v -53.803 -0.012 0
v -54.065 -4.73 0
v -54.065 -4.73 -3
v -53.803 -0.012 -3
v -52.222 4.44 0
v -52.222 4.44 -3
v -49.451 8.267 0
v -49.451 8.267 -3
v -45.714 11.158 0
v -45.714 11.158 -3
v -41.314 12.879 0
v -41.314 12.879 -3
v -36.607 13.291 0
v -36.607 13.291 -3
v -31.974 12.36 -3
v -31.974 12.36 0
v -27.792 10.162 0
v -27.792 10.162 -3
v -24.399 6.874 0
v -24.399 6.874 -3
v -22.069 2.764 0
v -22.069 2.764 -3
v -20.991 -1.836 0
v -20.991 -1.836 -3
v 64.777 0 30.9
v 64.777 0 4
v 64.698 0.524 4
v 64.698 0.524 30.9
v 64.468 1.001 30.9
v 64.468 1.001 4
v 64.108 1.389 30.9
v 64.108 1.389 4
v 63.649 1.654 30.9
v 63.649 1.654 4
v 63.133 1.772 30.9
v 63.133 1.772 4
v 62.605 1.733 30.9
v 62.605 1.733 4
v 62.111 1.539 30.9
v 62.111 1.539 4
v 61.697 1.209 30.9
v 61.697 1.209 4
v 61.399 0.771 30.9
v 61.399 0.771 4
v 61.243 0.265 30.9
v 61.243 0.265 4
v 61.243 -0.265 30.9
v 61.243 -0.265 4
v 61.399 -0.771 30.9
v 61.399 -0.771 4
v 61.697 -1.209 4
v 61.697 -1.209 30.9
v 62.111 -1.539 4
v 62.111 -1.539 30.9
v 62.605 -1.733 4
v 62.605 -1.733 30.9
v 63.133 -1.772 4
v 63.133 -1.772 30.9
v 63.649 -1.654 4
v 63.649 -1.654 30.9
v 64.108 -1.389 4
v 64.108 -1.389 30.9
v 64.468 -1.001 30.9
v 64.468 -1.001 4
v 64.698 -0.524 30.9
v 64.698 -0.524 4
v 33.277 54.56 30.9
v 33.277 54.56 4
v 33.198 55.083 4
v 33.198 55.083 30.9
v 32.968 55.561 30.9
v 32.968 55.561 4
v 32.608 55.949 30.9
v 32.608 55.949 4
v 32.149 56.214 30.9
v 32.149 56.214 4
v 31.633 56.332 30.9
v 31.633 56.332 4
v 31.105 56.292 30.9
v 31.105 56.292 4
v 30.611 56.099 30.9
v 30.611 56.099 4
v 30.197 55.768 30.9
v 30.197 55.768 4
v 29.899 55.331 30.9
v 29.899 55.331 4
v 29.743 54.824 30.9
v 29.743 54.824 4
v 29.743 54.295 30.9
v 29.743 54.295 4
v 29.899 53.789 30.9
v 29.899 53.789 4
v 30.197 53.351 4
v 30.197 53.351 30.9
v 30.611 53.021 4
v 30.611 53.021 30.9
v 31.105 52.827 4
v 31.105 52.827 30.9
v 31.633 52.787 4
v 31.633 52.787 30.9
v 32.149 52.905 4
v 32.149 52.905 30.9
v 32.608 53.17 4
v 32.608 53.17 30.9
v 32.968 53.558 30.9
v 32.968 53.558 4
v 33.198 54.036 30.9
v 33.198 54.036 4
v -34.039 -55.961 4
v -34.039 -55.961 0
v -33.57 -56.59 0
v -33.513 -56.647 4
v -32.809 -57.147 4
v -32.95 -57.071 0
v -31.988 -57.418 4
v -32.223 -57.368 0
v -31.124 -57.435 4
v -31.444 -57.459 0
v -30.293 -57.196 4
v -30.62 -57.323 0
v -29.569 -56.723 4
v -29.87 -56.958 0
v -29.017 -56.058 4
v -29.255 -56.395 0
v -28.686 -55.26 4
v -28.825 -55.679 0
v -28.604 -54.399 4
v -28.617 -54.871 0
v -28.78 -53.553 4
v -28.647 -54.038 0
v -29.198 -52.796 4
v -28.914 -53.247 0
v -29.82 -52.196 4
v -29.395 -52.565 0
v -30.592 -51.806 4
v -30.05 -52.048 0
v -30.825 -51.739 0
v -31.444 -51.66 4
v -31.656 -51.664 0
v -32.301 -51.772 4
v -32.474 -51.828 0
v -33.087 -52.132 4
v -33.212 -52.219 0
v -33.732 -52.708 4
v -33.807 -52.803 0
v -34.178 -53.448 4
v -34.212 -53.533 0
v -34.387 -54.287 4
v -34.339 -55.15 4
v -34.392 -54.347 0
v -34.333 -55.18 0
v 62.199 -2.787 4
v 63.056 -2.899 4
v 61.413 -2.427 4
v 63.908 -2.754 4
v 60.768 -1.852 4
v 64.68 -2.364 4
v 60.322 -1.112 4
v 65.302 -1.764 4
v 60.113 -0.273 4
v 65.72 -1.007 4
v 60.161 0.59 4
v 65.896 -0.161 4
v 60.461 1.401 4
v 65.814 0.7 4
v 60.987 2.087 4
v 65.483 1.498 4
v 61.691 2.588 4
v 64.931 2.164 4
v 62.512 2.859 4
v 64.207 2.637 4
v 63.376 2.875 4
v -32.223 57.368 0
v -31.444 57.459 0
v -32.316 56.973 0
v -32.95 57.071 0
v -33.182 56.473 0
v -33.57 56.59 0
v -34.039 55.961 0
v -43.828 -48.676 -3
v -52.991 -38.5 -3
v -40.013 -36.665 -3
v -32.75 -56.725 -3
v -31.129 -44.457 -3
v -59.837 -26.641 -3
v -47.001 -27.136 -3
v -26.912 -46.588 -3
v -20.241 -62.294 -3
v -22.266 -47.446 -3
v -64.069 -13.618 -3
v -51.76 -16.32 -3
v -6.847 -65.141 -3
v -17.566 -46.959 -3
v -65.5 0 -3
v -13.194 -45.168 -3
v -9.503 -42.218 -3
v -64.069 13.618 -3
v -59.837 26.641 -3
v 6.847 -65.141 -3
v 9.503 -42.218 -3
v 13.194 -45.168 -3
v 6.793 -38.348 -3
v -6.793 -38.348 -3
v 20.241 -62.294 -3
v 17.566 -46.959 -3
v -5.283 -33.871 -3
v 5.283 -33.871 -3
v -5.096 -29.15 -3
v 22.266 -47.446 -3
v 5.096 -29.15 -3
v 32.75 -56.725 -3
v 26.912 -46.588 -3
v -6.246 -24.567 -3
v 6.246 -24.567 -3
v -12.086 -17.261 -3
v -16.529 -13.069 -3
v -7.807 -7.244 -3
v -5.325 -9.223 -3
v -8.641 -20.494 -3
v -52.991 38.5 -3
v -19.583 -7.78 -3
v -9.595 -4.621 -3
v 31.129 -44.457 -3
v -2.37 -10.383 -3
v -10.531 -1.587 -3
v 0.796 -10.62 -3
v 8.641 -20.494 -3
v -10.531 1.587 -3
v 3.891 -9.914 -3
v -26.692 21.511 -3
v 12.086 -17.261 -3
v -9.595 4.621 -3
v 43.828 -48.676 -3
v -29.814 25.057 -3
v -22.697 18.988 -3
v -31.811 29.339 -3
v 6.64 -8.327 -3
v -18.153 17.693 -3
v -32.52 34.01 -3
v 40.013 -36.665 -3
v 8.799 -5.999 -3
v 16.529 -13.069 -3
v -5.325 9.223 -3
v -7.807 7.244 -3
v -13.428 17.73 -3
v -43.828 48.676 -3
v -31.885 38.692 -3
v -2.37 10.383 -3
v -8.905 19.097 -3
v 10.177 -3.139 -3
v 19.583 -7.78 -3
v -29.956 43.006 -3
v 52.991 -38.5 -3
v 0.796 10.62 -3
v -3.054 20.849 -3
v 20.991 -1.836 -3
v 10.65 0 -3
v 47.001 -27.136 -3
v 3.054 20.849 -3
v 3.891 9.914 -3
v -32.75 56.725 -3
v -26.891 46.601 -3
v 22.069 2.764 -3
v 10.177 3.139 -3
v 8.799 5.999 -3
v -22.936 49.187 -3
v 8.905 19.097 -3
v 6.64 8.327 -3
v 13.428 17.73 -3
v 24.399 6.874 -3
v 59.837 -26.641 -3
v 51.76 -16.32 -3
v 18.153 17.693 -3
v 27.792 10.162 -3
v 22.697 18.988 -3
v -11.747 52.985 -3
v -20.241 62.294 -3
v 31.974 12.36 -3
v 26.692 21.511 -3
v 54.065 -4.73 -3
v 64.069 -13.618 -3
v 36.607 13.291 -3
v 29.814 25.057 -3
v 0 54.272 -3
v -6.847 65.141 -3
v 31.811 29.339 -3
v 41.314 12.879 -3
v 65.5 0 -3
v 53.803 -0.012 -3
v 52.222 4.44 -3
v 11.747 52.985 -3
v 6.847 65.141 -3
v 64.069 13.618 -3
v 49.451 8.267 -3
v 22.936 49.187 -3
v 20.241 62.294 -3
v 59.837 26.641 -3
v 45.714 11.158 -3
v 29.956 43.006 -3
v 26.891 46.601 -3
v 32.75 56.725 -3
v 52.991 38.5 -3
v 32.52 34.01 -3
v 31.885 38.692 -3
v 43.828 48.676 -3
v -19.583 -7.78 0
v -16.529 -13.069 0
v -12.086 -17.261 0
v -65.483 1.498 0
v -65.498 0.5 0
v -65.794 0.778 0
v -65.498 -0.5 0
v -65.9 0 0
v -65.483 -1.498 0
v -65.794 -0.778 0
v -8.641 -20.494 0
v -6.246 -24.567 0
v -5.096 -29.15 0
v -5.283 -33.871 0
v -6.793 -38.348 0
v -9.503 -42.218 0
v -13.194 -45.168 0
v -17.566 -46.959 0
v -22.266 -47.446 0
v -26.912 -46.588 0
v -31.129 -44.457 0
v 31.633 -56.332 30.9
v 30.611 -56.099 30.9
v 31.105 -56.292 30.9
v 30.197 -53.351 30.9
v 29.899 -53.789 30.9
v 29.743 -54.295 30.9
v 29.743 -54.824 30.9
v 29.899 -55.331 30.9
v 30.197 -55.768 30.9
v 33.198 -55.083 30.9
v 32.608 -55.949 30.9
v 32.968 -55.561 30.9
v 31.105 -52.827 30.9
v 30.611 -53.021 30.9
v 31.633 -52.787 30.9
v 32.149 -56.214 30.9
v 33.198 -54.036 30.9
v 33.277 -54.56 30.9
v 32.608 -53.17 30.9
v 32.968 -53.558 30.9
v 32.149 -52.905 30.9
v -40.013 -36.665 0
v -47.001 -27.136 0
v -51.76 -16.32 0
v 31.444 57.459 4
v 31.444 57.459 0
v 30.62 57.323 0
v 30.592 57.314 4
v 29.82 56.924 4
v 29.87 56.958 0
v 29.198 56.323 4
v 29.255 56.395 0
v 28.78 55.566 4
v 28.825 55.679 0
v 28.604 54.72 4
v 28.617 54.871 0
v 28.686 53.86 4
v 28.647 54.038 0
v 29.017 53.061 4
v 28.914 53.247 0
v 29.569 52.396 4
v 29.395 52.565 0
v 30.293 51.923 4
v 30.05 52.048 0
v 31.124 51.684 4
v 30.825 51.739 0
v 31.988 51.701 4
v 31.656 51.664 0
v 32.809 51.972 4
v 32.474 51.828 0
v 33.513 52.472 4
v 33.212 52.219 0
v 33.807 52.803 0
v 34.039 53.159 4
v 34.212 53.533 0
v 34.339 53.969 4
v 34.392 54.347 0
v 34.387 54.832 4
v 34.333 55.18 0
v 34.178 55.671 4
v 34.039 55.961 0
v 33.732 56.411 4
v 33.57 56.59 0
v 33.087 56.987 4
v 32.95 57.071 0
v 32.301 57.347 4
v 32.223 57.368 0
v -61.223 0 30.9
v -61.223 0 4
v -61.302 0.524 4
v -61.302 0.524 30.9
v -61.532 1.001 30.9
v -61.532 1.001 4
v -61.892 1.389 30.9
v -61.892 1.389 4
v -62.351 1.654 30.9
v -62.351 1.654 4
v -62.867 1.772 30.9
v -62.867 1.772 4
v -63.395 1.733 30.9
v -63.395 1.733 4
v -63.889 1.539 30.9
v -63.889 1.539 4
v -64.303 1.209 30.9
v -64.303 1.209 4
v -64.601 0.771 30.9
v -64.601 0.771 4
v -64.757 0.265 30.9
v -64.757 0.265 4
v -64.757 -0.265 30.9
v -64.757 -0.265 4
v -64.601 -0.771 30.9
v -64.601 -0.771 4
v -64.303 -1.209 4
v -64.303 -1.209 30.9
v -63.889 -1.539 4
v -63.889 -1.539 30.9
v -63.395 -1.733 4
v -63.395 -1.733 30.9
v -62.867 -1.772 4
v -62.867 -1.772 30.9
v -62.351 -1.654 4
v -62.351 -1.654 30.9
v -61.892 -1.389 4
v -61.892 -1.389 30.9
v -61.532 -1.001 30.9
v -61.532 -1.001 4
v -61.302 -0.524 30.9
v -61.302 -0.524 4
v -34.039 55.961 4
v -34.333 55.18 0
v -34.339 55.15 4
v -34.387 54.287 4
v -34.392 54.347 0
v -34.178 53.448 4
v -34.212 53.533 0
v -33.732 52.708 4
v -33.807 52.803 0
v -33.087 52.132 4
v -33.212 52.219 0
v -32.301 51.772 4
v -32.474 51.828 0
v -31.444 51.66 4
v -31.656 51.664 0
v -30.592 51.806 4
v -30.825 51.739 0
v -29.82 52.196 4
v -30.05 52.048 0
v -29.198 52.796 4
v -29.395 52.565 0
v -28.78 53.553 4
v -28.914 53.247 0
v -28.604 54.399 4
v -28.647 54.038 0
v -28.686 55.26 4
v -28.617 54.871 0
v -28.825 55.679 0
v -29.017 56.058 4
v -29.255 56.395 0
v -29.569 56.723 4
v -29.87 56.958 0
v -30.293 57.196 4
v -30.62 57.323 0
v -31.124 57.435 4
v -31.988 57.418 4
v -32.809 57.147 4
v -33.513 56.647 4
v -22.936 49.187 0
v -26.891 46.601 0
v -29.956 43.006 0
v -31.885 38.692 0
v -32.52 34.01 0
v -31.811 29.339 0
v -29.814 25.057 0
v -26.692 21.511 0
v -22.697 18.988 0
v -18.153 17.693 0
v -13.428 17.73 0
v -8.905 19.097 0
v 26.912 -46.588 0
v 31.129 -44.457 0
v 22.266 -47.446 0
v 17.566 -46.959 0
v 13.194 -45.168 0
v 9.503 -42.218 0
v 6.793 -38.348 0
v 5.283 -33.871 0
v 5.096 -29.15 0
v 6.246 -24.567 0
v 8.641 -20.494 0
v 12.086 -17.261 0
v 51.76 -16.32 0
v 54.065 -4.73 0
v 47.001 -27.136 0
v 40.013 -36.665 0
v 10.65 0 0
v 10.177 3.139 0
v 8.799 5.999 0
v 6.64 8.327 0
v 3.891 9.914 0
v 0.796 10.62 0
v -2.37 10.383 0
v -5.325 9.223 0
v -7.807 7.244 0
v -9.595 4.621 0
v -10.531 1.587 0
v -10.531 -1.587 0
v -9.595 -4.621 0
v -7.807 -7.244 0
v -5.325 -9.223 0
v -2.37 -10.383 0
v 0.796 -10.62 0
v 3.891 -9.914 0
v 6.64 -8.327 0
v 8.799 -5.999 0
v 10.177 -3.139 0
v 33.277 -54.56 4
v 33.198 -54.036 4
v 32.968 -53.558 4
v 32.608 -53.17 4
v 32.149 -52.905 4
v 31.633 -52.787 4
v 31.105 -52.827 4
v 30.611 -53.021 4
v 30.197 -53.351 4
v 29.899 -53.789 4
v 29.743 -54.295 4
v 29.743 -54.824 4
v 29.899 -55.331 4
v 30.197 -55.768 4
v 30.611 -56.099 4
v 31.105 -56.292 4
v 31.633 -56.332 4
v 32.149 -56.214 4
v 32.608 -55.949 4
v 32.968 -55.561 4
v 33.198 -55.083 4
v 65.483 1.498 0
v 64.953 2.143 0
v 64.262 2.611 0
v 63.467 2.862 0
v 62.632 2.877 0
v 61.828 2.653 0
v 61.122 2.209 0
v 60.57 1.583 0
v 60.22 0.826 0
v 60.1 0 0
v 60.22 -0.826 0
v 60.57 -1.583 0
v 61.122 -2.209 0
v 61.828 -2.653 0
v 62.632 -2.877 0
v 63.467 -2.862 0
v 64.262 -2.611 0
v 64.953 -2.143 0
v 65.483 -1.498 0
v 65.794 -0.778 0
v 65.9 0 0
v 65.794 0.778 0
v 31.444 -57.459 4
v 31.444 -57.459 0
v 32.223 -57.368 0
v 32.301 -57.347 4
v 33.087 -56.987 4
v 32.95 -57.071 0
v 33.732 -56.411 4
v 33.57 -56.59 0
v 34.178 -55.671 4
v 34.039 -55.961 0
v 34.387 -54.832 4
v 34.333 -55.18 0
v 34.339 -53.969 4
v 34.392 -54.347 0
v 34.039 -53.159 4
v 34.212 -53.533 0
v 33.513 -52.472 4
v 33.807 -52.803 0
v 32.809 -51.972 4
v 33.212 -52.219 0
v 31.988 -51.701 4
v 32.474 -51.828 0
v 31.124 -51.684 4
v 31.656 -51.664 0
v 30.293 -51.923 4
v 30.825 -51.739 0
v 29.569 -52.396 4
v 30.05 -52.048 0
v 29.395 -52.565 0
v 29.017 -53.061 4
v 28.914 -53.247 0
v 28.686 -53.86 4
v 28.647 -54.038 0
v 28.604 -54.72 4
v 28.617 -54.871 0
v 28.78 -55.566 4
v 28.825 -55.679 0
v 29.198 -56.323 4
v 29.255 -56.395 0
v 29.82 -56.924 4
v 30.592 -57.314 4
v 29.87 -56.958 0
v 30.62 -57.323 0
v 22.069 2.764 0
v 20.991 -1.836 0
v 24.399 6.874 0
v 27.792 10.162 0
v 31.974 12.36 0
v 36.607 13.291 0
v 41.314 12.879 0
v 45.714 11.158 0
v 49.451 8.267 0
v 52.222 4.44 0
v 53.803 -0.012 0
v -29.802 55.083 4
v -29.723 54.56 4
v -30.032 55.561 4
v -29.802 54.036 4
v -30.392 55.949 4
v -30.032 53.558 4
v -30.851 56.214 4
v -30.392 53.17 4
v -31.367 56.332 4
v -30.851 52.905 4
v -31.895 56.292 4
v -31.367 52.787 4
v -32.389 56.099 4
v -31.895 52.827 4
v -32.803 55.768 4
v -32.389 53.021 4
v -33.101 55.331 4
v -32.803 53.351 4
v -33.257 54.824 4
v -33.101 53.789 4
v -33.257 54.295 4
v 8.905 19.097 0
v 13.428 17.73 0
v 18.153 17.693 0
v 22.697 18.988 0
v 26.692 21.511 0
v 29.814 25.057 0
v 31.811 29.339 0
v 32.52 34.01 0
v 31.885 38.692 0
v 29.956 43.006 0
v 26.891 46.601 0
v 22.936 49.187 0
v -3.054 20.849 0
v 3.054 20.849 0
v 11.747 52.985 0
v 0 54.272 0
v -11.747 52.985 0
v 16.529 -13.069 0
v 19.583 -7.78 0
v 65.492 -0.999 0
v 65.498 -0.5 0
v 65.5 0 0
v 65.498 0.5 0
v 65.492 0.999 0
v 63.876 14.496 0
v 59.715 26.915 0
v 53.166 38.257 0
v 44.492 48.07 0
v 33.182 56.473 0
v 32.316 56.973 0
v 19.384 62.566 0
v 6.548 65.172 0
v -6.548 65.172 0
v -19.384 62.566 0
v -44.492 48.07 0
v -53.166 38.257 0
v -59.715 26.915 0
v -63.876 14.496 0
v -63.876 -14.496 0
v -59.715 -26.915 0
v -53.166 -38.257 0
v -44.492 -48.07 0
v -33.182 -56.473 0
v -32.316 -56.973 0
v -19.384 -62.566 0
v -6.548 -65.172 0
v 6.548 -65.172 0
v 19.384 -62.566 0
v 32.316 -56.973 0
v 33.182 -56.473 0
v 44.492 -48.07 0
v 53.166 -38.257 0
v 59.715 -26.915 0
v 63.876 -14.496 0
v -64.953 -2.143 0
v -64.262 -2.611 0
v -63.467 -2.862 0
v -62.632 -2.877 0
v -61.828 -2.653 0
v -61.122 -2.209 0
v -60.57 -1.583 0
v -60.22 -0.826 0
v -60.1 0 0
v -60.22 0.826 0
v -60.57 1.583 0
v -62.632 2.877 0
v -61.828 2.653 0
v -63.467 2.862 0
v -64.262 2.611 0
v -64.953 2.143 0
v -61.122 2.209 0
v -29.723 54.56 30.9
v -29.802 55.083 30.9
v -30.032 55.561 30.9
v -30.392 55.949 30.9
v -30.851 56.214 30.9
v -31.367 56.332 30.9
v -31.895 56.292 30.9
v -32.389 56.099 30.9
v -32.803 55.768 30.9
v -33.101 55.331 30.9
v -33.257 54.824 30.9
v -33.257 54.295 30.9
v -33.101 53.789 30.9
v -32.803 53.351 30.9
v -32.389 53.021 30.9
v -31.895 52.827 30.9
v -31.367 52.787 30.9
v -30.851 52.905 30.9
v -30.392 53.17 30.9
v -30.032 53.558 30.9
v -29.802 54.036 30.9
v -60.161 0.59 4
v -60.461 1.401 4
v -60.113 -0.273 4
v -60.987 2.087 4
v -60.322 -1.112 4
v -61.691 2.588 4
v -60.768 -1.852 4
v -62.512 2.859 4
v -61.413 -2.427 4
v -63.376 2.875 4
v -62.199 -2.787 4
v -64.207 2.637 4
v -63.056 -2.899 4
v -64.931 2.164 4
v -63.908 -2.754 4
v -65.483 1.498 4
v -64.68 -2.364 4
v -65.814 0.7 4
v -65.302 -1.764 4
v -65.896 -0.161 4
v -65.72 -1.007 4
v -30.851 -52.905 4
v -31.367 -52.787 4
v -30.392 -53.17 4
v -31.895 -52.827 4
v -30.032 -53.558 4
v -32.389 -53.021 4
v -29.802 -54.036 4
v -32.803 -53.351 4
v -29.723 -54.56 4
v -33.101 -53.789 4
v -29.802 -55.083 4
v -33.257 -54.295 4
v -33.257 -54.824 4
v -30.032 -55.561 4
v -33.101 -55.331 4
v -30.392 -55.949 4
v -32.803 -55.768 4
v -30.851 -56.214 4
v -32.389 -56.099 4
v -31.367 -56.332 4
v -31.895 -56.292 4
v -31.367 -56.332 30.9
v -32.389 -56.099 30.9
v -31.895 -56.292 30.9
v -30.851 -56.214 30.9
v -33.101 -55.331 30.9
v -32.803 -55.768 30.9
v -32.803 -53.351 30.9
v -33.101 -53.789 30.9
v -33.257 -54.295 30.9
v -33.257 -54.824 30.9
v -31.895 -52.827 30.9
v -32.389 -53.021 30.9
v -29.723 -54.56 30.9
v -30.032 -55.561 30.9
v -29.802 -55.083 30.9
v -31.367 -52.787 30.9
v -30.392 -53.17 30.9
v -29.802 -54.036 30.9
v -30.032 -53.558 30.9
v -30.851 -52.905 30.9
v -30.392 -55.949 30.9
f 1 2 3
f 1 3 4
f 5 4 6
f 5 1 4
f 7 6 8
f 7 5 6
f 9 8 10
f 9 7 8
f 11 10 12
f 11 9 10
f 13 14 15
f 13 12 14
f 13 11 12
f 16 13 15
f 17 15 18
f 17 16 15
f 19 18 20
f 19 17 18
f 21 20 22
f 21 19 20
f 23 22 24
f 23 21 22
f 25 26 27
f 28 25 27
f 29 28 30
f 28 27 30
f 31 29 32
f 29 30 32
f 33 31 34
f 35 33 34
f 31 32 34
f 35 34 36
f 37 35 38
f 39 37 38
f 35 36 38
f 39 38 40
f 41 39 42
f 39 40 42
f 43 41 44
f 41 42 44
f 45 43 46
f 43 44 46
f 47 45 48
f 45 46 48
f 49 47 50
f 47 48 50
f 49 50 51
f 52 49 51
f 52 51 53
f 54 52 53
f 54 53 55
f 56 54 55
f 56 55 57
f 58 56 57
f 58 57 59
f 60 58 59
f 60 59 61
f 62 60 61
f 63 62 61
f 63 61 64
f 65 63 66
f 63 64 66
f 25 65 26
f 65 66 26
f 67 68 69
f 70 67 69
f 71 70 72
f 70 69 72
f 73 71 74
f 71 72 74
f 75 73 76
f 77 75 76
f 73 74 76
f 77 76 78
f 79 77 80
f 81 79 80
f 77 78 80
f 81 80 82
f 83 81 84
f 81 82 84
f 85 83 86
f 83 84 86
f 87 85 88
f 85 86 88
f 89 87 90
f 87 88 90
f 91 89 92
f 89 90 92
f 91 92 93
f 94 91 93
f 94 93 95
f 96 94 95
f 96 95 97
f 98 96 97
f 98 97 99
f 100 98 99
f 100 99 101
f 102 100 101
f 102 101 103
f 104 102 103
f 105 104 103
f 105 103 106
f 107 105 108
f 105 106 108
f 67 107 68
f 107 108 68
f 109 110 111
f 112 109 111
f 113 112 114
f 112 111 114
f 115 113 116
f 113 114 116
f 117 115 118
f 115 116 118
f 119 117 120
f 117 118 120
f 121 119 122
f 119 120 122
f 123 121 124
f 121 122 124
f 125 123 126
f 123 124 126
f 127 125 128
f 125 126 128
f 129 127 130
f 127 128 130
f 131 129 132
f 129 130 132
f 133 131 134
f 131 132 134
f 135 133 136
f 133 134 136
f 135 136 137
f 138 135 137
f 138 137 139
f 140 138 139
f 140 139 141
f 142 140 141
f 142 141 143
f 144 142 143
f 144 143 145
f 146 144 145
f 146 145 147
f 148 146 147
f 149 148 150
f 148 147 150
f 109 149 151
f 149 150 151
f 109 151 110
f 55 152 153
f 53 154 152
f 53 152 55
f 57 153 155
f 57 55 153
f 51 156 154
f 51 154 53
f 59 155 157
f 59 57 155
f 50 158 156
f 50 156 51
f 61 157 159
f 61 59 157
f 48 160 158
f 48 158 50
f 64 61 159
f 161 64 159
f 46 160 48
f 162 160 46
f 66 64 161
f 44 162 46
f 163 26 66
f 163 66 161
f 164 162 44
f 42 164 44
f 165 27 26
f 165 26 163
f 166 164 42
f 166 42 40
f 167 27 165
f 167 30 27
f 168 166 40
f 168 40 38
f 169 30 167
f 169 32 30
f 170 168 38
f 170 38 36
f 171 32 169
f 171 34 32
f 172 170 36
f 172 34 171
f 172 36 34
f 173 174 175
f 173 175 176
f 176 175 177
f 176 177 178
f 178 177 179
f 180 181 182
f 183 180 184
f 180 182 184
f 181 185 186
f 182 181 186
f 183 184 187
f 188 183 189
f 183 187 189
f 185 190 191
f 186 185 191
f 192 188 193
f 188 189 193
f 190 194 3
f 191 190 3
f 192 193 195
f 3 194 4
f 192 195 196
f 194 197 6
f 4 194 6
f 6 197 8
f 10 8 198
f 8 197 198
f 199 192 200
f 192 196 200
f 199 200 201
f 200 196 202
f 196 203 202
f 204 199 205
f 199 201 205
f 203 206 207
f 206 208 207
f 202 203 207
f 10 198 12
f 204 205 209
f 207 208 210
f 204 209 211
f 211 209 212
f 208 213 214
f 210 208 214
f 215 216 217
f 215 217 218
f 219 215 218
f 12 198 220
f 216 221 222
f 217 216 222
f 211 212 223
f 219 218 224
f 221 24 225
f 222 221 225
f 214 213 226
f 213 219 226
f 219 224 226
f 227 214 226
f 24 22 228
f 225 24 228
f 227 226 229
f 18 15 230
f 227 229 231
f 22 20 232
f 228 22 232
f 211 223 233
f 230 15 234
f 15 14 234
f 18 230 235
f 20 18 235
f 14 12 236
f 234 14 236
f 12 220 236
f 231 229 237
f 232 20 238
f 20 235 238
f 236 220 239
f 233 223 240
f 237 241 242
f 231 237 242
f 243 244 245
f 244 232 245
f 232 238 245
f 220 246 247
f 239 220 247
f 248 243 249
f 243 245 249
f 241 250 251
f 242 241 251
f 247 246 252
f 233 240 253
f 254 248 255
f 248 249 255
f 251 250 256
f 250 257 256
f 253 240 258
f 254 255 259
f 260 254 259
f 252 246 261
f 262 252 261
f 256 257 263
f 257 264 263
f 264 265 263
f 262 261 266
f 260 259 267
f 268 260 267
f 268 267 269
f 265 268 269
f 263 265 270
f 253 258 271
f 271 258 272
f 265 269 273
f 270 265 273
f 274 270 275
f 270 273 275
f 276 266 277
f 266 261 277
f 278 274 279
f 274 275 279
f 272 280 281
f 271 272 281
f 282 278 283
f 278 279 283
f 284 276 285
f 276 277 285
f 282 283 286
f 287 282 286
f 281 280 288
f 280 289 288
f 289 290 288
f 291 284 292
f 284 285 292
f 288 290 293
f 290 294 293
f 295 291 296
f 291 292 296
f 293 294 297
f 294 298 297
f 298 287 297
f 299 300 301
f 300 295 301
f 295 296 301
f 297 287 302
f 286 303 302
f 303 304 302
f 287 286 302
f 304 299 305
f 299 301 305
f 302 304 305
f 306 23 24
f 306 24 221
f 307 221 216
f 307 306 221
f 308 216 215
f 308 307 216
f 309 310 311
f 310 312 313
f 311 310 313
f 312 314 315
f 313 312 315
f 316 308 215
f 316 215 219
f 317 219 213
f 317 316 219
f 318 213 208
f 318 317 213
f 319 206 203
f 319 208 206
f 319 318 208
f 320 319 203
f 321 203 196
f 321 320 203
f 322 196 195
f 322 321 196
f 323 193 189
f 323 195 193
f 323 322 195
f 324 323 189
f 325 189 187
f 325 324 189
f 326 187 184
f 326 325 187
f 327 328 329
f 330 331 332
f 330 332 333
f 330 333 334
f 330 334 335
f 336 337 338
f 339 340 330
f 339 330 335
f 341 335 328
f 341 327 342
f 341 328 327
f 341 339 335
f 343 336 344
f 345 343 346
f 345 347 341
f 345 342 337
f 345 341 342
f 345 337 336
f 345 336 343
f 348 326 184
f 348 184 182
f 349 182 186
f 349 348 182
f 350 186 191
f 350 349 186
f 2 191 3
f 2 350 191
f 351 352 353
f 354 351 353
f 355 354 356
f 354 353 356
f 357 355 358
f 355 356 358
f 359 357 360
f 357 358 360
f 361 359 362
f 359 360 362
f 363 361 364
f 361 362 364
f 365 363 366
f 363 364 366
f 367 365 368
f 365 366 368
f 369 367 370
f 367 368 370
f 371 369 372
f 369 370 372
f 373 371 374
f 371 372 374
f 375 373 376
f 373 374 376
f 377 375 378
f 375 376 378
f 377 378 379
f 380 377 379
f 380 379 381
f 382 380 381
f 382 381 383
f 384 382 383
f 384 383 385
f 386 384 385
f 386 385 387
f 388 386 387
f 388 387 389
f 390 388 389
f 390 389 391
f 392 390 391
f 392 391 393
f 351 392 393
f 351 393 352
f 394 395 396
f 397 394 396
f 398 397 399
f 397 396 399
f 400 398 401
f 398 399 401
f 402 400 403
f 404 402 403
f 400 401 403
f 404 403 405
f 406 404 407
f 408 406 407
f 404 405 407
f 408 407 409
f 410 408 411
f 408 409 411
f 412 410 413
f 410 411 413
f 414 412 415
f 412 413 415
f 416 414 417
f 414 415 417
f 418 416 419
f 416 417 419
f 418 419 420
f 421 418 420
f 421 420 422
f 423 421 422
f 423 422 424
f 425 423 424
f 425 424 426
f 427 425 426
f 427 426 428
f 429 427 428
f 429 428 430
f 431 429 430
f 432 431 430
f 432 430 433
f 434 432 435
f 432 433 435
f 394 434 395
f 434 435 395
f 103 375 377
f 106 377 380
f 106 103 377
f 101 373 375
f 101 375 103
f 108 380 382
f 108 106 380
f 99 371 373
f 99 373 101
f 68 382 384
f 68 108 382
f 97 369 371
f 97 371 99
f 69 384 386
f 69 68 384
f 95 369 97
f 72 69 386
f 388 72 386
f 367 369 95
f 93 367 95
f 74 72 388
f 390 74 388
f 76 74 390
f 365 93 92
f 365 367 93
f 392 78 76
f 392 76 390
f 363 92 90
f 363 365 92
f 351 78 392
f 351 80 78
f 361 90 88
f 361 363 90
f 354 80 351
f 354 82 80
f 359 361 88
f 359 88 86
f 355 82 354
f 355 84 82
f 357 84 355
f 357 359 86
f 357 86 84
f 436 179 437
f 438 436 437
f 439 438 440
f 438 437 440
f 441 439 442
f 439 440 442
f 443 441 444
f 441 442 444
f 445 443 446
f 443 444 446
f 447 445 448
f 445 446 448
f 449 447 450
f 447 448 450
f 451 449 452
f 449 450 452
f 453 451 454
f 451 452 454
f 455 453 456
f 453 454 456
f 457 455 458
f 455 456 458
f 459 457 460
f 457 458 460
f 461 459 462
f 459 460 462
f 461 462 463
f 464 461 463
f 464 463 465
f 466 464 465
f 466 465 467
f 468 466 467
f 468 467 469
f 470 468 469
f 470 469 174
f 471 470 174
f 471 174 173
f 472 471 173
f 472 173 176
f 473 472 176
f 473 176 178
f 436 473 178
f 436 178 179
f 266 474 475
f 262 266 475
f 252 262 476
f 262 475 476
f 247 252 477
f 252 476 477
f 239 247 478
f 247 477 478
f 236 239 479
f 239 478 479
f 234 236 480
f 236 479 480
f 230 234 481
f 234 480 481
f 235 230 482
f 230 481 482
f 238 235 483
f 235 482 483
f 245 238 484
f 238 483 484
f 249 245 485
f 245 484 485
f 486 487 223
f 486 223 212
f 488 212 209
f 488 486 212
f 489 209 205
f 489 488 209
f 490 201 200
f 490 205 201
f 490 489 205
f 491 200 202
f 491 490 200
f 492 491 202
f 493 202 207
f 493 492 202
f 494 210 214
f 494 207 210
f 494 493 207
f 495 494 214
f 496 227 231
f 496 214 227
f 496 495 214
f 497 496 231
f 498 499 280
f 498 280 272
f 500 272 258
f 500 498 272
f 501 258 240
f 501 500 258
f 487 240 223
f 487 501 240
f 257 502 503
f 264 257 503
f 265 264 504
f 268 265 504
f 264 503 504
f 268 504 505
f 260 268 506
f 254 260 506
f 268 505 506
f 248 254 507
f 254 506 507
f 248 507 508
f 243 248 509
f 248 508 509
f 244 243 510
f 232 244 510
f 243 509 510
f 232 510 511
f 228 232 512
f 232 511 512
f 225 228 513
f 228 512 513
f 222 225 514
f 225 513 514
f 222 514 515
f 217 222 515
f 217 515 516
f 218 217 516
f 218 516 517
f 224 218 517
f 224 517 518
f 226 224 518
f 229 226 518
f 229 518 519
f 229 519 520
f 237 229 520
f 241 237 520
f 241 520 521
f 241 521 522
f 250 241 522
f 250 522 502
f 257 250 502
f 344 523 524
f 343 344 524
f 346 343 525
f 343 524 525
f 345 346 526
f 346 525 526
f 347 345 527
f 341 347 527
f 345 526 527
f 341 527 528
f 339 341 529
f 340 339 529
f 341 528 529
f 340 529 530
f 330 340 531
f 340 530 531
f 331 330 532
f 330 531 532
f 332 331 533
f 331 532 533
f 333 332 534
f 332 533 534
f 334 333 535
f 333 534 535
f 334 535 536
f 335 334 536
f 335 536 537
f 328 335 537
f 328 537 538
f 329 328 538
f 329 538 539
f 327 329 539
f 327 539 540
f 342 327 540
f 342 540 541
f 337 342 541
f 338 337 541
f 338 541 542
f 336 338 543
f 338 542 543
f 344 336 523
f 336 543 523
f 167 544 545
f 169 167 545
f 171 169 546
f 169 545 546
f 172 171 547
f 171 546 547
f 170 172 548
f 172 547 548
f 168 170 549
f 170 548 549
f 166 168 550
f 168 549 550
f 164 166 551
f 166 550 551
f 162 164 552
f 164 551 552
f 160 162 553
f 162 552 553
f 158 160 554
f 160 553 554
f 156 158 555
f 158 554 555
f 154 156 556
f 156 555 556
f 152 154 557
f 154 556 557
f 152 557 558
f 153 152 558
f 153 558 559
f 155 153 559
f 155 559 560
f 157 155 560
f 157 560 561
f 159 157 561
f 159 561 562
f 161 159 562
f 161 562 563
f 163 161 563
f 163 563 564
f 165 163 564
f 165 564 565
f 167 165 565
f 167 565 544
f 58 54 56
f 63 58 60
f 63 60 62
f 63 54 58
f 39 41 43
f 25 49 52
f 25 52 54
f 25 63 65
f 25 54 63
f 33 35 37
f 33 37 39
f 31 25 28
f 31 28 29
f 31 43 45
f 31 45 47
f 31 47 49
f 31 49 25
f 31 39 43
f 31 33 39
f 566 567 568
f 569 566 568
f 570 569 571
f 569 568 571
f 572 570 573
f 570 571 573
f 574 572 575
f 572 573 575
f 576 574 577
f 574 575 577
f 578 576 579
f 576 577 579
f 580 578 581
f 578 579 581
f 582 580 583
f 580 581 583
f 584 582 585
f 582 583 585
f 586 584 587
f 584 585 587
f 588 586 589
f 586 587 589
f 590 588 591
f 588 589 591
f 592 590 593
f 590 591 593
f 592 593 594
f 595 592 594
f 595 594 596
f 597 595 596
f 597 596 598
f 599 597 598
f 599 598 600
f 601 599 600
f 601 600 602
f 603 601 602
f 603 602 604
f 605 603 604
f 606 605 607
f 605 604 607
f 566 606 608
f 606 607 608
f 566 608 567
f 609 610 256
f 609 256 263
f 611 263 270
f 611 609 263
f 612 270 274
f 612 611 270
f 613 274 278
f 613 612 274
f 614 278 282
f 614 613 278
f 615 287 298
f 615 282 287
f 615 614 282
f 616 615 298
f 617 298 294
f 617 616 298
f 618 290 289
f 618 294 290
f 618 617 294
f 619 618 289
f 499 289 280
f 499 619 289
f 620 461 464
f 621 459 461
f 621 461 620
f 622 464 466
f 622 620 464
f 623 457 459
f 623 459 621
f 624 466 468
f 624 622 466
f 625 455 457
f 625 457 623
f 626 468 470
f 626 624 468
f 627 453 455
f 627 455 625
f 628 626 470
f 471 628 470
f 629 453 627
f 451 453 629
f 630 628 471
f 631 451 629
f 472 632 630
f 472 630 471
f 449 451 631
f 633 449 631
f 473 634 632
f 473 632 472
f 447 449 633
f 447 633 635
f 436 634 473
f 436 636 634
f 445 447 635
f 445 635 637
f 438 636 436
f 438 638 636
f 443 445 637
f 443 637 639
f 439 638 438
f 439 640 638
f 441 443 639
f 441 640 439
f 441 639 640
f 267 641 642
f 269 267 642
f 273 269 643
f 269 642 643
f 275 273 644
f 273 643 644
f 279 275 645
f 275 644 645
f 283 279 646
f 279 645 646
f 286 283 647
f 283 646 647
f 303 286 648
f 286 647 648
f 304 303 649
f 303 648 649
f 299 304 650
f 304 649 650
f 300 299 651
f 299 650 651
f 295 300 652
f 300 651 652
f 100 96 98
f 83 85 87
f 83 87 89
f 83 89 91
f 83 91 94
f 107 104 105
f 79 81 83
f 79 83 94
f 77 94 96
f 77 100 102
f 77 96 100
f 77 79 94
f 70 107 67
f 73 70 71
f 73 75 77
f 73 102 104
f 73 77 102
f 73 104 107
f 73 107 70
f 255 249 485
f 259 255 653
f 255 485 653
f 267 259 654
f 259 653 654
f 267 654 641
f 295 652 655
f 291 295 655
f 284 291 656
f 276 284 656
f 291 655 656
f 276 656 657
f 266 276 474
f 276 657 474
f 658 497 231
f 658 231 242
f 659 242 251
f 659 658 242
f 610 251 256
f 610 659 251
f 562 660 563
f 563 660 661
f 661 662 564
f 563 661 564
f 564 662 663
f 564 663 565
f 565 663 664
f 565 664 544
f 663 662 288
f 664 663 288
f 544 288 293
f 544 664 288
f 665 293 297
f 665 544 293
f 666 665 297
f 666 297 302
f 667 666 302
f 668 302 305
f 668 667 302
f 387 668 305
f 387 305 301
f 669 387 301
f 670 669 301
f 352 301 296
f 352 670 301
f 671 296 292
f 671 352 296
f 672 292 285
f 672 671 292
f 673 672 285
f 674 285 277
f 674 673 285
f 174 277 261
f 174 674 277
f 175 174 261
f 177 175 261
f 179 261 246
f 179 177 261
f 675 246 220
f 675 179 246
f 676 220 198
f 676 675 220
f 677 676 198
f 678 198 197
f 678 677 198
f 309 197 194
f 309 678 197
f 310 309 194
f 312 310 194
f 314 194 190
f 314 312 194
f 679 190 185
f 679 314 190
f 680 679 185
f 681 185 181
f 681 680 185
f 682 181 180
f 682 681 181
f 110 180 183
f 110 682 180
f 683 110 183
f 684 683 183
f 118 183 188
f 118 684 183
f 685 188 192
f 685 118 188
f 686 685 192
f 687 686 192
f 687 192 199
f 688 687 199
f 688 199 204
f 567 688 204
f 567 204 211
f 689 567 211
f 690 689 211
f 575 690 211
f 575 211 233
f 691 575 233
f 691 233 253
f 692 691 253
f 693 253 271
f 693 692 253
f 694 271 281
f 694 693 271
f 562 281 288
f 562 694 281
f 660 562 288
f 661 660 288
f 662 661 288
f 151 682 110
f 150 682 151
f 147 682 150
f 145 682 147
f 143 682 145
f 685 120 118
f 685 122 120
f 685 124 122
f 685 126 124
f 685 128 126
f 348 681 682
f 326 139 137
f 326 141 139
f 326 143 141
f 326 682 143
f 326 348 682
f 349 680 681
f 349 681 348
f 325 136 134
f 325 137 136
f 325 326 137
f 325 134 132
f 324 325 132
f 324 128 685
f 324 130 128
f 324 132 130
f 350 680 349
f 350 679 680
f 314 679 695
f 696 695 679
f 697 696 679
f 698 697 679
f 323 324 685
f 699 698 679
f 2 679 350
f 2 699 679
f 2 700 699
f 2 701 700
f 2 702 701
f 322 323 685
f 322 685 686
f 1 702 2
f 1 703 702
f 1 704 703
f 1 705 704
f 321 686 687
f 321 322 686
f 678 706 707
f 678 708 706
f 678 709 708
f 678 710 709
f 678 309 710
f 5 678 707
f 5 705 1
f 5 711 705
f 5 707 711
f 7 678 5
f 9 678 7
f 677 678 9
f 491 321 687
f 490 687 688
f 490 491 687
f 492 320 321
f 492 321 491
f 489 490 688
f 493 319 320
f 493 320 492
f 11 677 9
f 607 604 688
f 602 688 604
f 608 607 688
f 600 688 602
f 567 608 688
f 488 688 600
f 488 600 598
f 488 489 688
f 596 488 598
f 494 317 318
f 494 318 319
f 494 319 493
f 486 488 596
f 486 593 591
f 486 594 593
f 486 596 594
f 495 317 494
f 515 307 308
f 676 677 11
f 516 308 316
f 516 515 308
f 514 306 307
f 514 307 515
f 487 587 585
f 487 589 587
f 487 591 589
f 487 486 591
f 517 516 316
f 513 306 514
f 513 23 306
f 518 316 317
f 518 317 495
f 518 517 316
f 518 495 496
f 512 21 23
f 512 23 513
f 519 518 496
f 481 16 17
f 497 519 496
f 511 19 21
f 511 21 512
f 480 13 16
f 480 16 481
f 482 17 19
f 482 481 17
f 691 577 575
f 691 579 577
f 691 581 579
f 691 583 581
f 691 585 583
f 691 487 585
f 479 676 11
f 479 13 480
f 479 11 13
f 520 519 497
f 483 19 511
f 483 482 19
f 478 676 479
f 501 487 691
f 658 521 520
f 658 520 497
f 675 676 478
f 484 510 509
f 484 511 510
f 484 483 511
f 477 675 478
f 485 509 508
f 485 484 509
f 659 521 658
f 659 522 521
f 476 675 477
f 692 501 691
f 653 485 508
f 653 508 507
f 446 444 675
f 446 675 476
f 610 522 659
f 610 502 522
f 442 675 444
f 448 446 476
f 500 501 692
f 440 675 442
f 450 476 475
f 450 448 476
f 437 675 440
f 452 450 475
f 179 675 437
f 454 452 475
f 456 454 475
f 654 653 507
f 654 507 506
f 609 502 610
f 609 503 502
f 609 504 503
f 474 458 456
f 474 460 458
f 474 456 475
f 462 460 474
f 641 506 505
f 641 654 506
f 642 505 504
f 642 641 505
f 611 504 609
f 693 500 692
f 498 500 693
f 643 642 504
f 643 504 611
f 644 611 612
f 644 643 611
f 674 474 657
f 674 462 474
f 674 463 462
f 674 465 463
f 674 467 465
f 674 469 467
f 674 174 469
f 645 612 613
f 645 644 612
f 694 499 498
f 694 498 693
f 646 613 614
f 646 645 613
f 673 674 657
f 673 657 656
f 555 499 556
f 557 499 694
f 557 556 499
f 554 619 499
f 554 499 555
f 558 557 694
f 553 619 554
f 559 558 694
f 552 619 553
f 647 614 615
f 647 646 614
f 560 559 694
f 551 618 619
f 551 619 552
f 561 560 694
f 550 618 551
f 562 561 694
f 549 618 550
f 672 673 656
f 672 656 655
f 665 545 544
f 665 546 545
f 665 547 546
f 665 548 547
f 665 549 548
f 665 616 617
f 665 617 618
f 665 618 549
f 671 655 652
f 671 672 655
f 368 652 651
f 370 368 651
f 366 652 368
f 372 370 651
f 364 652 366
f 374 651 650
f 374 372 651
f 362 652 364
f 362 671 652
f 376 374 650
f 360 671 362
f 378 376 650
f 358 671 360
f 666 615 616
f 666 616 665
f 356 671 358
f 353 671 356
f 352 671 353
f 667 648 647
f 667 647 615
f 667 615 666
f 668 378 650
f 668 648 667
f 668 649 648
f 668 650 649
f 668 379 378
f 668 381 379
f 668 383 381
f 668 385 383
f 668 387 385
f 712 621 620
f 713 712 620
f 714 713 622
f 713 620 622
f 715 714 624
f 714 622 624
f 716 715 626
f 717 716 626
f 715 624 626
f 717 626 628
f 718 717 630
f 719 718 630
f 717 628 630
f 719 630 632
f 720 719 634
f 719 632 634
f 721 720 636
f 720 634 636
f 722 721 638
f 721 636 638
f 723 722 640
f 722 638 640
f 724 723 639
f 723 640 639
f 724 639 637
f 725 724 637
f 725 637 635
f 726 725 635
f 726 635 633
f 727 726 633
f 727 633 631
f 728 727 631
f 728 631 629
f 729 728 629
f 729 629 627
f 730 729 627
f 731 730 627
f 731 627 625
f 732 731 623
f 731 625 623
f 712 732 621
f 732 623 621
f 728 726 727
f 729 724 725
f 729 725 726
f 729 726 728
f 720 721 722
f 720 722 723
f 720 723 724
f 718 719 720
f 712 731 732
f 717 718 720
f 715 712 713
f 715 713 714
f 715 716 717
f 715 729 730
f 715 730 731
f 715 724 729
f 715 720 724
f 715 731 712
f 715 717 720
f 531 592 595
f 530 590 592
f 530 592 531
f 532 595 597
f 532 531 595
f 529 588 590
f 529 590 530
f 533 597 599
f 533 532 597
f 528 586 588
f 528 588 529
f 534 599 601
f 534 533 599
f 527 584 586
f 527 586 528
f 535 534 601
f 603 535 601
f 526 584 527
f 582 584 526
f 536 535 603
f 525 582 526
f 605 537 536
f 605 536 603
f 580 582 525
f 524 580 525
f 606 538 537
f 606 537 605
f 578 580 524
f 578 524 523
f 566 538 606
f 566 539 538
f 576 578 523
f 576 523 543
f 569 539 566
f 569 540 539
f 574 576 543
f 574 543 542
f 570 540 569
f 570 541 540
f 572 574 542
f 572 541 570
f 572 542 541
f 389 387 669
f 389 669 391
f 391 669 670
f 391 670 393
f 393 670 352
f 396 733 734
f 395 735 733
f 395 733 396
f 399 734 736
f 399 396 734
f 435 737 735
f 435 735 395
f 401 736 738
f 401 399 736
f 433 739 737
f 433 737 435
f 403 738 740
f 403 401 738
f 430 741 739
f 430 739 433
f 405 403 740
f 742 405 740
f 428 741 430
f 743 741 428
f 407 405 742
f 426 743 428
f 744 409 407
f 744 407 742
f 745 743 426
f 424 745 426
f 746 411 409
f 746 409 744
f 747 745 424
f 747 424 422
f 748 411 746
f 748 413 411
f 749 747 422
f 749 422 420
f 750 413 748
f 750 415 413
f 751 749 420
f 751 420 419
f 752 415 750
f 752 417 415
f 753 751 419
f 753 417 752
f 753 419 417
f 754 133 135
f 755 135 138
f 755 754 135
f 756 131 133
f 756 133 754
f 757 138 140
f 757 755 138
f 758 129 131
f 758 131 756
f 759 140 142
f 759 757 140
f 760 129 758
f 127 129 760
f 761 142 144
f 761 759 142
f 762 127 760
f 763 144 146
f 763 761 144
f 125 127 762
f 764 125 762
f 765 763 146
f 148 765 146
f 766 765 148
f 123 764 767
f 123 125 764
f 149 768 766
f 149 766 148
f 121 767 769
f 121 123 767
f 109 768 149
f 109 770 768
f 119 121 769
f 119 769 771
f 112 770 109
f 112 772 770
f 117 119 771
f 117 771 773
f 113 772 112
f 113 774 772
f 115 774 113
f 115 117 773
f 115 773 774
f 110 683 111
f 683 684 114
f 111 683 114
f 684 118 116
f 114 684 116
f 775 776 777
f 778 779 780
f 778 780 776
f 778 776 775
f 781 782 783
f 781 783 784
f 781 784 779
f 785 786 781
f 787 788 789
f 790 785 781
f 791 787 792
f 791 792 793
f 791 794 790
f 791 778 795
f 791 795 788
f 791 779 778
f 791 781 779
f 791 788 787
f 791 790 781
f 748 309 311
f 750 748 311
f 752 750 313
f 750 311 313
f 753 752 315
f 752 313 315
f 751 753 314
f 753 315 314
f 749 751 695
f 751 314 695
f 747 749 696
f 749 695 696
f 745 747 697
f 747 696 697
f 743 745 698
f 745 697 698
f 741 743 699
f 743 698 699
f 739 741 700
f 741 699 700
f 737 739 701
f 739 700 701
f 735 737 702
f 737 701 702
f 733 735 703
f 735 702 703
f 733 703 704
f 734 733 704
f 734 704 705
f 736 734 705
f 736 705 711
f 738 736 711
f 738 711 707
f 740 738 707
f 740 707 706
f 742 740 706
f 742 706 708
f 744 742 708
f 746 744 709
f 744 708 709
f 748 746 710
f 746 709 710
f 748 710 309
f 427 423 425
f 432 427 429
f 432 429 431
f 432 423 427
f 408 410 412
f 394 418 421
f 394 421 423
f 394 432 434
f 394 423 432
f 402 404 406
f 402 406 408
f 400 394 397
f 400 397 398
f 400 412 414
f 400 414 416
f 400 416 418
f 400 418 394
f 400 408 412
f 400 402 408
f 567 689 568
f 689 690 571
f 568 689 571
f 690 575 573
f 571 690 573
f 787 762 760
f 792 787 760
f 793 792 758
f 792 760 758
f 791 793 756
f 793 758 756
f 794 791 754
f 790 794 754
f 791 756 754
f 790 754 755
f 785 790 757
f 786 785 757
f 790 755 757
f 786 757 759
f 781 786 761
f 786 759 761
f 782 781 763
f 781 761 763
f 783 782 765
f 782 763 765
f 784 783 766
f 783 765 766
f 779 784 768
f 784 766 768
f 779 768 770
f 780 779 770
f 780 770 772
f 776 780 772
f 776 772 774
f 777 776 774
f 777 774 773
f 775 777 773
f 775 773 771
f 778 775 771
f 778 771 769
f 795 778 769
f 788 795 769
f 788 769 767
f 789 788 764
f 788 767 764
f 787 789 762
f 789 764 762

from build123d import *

# Parameters (mm, degrees)
SKETCH_1_R          = 65.5
EXTRUDE_1_DEPTH     = 3
SKETCH_2_R          = 2.9
EXTRUDE_2_DEPTH     = 4
SKETCH_3_R          = 10.65
CUT_EXTRUDE_1_DEPTH = 94.00032258
SKETCH_4_R          = 1.777177549
EXTRUDE_3_DEPTH     = 26.9
CUT_EXTRUDE_2_DEPTH = 98.917669498


with BuildPart() as part:
    # 草图1 → 凸台-拉伸1 (new body)
    with BuildSketch(Plane.XY):
        Circle(SKETCH_1_R)
    extrude(amount=-EXTRUDE_1_DEPTH)

    # 草图2 → 凸台-拉伸2 (add)
    with BuildSketch(Plane.XY):
        with Locations(Location((-63, 0, 0), (0, 0, 148.88786163))):
            Circle(SKETCH_2_R)
        with Locations(Location((-31.5, 54.559600438, 0), (0, 0, 151.11213837))):
            Circle(SKETCH_2_R)
        with Locations(Location((31.5, 54.559600438, 0), (0, 0, 91.11213837))):
            Circle(SKETCH_2_R)
        with Locations(Location((63, 0, 0), (0, 0, 31.11213837))):
            Circle(SKETCH_2_R)
        with Locations(Location((31.5, -54.559600438, 0), (0, 0, 268.88786163))):
            Circle(SKETCH_2_R)
        with Locations(Location((-31.5, -54.559600438, 0), (0, 0, 208.88786163))):
            Circle(SKETCH_2_R)
    extrude(amount=EXTRUDE_2_DEPTH)

    # 草图3 → 切除-拉伸1 (cut, through all)
    with BuildSketch(Plane.XY):
        Circle(SKETCH_3_R)
    extrude(amount=-CUT_EXTRUDE_1_DEPTH, mode=Mode.SUBTRACT)

    # 草图4 → 凸台-拉伸3 (add)
    with BuildSketch(Plane.XY.offset(4)):
        with Locations((-31.5, 54.559600438)):
            Circle(SKETCH_4_R)
        with Locations((31.5, 54.559600438)):
            Circle(SKETCH_4_R)
        with Locations((63, 0)):
            Circle(SKETCH_4_R)
        with Locations((31.5, -54.559600438)):
            Circle(SKETCH_4_R)
        with Locations((-31.5, -54.559600438)):
            Circle(SKETCH_4_R)
        with Locations((-63, 0)):
            Circle(SKETCH_4_R)
    extrude(amount=EXTRUDE_3_DEPTH)

    # 草图5 → 切除-拉伸2 (cut, through all)
    with BuildSketch(Plane.XY):
        with BuildLine():
            ThreePointArc((22.936143614, 49.18671871), (0, 54.27153933), (-22.936143614, 49.18671871))
            ThreePointArc((-22.936143614, 49.18671871), (-30.965446368, 27.126390699), (-8.905118357, 19.097087944))
            ThreePointArc((-8.905118357, 19.097087944), (0, 21.071305154), (8.905118357, 19.097087944))
            ThreePointArc((8.905118357, 19.097087944), (30.965446368, 27.126390699), (22.936143614, 49.18671871))
        make_face()
        with BuildLine():
            ThreePointArc((12.08600412, -17.260602693), (18.248285555, -10.535652577), (20.991122477, -1.836485251))
            ThreePointArc((20.991122477, -1.836485251), (38.974866642, 13.253667845), (54.065019738, -4.73007632))
            ThreePointArc((54.065019738, -4.73007632), (47.000531763, -27.135769665), (31.128876124, -44.456642389))
            ThreePointArc((31.128876124, -44.456642389), (8.009420274, -40.380058544), (12.08600412, -17.260602693))
        make_face()
        with BuildLine():
            ThreePointArc((-20.991122477, -1.836485251), (-18.248285555, -10.535652577), (-12.08600412, -17.260602693))
            ThreePointArc((-12.08600412, -17.260602693), (-8.009420274, -40.380058544), (-31.128876124, -44.456642389))
            ThreePointArc((-31.128876124, -44.456642389), (-47.000531763, -27.135769665), (-54.065019738, -4.73007632))
            ThreePointArc((-54.065019738, -4.73007632), (-38.974866642, 13.253667845), (-20.991122477, -1.836485251))
        make_face()
    extrude(amount=-CUT_EXTRUDE_2_DEPTH, mode=Mode.SUBTRACT)


solid = part.part
